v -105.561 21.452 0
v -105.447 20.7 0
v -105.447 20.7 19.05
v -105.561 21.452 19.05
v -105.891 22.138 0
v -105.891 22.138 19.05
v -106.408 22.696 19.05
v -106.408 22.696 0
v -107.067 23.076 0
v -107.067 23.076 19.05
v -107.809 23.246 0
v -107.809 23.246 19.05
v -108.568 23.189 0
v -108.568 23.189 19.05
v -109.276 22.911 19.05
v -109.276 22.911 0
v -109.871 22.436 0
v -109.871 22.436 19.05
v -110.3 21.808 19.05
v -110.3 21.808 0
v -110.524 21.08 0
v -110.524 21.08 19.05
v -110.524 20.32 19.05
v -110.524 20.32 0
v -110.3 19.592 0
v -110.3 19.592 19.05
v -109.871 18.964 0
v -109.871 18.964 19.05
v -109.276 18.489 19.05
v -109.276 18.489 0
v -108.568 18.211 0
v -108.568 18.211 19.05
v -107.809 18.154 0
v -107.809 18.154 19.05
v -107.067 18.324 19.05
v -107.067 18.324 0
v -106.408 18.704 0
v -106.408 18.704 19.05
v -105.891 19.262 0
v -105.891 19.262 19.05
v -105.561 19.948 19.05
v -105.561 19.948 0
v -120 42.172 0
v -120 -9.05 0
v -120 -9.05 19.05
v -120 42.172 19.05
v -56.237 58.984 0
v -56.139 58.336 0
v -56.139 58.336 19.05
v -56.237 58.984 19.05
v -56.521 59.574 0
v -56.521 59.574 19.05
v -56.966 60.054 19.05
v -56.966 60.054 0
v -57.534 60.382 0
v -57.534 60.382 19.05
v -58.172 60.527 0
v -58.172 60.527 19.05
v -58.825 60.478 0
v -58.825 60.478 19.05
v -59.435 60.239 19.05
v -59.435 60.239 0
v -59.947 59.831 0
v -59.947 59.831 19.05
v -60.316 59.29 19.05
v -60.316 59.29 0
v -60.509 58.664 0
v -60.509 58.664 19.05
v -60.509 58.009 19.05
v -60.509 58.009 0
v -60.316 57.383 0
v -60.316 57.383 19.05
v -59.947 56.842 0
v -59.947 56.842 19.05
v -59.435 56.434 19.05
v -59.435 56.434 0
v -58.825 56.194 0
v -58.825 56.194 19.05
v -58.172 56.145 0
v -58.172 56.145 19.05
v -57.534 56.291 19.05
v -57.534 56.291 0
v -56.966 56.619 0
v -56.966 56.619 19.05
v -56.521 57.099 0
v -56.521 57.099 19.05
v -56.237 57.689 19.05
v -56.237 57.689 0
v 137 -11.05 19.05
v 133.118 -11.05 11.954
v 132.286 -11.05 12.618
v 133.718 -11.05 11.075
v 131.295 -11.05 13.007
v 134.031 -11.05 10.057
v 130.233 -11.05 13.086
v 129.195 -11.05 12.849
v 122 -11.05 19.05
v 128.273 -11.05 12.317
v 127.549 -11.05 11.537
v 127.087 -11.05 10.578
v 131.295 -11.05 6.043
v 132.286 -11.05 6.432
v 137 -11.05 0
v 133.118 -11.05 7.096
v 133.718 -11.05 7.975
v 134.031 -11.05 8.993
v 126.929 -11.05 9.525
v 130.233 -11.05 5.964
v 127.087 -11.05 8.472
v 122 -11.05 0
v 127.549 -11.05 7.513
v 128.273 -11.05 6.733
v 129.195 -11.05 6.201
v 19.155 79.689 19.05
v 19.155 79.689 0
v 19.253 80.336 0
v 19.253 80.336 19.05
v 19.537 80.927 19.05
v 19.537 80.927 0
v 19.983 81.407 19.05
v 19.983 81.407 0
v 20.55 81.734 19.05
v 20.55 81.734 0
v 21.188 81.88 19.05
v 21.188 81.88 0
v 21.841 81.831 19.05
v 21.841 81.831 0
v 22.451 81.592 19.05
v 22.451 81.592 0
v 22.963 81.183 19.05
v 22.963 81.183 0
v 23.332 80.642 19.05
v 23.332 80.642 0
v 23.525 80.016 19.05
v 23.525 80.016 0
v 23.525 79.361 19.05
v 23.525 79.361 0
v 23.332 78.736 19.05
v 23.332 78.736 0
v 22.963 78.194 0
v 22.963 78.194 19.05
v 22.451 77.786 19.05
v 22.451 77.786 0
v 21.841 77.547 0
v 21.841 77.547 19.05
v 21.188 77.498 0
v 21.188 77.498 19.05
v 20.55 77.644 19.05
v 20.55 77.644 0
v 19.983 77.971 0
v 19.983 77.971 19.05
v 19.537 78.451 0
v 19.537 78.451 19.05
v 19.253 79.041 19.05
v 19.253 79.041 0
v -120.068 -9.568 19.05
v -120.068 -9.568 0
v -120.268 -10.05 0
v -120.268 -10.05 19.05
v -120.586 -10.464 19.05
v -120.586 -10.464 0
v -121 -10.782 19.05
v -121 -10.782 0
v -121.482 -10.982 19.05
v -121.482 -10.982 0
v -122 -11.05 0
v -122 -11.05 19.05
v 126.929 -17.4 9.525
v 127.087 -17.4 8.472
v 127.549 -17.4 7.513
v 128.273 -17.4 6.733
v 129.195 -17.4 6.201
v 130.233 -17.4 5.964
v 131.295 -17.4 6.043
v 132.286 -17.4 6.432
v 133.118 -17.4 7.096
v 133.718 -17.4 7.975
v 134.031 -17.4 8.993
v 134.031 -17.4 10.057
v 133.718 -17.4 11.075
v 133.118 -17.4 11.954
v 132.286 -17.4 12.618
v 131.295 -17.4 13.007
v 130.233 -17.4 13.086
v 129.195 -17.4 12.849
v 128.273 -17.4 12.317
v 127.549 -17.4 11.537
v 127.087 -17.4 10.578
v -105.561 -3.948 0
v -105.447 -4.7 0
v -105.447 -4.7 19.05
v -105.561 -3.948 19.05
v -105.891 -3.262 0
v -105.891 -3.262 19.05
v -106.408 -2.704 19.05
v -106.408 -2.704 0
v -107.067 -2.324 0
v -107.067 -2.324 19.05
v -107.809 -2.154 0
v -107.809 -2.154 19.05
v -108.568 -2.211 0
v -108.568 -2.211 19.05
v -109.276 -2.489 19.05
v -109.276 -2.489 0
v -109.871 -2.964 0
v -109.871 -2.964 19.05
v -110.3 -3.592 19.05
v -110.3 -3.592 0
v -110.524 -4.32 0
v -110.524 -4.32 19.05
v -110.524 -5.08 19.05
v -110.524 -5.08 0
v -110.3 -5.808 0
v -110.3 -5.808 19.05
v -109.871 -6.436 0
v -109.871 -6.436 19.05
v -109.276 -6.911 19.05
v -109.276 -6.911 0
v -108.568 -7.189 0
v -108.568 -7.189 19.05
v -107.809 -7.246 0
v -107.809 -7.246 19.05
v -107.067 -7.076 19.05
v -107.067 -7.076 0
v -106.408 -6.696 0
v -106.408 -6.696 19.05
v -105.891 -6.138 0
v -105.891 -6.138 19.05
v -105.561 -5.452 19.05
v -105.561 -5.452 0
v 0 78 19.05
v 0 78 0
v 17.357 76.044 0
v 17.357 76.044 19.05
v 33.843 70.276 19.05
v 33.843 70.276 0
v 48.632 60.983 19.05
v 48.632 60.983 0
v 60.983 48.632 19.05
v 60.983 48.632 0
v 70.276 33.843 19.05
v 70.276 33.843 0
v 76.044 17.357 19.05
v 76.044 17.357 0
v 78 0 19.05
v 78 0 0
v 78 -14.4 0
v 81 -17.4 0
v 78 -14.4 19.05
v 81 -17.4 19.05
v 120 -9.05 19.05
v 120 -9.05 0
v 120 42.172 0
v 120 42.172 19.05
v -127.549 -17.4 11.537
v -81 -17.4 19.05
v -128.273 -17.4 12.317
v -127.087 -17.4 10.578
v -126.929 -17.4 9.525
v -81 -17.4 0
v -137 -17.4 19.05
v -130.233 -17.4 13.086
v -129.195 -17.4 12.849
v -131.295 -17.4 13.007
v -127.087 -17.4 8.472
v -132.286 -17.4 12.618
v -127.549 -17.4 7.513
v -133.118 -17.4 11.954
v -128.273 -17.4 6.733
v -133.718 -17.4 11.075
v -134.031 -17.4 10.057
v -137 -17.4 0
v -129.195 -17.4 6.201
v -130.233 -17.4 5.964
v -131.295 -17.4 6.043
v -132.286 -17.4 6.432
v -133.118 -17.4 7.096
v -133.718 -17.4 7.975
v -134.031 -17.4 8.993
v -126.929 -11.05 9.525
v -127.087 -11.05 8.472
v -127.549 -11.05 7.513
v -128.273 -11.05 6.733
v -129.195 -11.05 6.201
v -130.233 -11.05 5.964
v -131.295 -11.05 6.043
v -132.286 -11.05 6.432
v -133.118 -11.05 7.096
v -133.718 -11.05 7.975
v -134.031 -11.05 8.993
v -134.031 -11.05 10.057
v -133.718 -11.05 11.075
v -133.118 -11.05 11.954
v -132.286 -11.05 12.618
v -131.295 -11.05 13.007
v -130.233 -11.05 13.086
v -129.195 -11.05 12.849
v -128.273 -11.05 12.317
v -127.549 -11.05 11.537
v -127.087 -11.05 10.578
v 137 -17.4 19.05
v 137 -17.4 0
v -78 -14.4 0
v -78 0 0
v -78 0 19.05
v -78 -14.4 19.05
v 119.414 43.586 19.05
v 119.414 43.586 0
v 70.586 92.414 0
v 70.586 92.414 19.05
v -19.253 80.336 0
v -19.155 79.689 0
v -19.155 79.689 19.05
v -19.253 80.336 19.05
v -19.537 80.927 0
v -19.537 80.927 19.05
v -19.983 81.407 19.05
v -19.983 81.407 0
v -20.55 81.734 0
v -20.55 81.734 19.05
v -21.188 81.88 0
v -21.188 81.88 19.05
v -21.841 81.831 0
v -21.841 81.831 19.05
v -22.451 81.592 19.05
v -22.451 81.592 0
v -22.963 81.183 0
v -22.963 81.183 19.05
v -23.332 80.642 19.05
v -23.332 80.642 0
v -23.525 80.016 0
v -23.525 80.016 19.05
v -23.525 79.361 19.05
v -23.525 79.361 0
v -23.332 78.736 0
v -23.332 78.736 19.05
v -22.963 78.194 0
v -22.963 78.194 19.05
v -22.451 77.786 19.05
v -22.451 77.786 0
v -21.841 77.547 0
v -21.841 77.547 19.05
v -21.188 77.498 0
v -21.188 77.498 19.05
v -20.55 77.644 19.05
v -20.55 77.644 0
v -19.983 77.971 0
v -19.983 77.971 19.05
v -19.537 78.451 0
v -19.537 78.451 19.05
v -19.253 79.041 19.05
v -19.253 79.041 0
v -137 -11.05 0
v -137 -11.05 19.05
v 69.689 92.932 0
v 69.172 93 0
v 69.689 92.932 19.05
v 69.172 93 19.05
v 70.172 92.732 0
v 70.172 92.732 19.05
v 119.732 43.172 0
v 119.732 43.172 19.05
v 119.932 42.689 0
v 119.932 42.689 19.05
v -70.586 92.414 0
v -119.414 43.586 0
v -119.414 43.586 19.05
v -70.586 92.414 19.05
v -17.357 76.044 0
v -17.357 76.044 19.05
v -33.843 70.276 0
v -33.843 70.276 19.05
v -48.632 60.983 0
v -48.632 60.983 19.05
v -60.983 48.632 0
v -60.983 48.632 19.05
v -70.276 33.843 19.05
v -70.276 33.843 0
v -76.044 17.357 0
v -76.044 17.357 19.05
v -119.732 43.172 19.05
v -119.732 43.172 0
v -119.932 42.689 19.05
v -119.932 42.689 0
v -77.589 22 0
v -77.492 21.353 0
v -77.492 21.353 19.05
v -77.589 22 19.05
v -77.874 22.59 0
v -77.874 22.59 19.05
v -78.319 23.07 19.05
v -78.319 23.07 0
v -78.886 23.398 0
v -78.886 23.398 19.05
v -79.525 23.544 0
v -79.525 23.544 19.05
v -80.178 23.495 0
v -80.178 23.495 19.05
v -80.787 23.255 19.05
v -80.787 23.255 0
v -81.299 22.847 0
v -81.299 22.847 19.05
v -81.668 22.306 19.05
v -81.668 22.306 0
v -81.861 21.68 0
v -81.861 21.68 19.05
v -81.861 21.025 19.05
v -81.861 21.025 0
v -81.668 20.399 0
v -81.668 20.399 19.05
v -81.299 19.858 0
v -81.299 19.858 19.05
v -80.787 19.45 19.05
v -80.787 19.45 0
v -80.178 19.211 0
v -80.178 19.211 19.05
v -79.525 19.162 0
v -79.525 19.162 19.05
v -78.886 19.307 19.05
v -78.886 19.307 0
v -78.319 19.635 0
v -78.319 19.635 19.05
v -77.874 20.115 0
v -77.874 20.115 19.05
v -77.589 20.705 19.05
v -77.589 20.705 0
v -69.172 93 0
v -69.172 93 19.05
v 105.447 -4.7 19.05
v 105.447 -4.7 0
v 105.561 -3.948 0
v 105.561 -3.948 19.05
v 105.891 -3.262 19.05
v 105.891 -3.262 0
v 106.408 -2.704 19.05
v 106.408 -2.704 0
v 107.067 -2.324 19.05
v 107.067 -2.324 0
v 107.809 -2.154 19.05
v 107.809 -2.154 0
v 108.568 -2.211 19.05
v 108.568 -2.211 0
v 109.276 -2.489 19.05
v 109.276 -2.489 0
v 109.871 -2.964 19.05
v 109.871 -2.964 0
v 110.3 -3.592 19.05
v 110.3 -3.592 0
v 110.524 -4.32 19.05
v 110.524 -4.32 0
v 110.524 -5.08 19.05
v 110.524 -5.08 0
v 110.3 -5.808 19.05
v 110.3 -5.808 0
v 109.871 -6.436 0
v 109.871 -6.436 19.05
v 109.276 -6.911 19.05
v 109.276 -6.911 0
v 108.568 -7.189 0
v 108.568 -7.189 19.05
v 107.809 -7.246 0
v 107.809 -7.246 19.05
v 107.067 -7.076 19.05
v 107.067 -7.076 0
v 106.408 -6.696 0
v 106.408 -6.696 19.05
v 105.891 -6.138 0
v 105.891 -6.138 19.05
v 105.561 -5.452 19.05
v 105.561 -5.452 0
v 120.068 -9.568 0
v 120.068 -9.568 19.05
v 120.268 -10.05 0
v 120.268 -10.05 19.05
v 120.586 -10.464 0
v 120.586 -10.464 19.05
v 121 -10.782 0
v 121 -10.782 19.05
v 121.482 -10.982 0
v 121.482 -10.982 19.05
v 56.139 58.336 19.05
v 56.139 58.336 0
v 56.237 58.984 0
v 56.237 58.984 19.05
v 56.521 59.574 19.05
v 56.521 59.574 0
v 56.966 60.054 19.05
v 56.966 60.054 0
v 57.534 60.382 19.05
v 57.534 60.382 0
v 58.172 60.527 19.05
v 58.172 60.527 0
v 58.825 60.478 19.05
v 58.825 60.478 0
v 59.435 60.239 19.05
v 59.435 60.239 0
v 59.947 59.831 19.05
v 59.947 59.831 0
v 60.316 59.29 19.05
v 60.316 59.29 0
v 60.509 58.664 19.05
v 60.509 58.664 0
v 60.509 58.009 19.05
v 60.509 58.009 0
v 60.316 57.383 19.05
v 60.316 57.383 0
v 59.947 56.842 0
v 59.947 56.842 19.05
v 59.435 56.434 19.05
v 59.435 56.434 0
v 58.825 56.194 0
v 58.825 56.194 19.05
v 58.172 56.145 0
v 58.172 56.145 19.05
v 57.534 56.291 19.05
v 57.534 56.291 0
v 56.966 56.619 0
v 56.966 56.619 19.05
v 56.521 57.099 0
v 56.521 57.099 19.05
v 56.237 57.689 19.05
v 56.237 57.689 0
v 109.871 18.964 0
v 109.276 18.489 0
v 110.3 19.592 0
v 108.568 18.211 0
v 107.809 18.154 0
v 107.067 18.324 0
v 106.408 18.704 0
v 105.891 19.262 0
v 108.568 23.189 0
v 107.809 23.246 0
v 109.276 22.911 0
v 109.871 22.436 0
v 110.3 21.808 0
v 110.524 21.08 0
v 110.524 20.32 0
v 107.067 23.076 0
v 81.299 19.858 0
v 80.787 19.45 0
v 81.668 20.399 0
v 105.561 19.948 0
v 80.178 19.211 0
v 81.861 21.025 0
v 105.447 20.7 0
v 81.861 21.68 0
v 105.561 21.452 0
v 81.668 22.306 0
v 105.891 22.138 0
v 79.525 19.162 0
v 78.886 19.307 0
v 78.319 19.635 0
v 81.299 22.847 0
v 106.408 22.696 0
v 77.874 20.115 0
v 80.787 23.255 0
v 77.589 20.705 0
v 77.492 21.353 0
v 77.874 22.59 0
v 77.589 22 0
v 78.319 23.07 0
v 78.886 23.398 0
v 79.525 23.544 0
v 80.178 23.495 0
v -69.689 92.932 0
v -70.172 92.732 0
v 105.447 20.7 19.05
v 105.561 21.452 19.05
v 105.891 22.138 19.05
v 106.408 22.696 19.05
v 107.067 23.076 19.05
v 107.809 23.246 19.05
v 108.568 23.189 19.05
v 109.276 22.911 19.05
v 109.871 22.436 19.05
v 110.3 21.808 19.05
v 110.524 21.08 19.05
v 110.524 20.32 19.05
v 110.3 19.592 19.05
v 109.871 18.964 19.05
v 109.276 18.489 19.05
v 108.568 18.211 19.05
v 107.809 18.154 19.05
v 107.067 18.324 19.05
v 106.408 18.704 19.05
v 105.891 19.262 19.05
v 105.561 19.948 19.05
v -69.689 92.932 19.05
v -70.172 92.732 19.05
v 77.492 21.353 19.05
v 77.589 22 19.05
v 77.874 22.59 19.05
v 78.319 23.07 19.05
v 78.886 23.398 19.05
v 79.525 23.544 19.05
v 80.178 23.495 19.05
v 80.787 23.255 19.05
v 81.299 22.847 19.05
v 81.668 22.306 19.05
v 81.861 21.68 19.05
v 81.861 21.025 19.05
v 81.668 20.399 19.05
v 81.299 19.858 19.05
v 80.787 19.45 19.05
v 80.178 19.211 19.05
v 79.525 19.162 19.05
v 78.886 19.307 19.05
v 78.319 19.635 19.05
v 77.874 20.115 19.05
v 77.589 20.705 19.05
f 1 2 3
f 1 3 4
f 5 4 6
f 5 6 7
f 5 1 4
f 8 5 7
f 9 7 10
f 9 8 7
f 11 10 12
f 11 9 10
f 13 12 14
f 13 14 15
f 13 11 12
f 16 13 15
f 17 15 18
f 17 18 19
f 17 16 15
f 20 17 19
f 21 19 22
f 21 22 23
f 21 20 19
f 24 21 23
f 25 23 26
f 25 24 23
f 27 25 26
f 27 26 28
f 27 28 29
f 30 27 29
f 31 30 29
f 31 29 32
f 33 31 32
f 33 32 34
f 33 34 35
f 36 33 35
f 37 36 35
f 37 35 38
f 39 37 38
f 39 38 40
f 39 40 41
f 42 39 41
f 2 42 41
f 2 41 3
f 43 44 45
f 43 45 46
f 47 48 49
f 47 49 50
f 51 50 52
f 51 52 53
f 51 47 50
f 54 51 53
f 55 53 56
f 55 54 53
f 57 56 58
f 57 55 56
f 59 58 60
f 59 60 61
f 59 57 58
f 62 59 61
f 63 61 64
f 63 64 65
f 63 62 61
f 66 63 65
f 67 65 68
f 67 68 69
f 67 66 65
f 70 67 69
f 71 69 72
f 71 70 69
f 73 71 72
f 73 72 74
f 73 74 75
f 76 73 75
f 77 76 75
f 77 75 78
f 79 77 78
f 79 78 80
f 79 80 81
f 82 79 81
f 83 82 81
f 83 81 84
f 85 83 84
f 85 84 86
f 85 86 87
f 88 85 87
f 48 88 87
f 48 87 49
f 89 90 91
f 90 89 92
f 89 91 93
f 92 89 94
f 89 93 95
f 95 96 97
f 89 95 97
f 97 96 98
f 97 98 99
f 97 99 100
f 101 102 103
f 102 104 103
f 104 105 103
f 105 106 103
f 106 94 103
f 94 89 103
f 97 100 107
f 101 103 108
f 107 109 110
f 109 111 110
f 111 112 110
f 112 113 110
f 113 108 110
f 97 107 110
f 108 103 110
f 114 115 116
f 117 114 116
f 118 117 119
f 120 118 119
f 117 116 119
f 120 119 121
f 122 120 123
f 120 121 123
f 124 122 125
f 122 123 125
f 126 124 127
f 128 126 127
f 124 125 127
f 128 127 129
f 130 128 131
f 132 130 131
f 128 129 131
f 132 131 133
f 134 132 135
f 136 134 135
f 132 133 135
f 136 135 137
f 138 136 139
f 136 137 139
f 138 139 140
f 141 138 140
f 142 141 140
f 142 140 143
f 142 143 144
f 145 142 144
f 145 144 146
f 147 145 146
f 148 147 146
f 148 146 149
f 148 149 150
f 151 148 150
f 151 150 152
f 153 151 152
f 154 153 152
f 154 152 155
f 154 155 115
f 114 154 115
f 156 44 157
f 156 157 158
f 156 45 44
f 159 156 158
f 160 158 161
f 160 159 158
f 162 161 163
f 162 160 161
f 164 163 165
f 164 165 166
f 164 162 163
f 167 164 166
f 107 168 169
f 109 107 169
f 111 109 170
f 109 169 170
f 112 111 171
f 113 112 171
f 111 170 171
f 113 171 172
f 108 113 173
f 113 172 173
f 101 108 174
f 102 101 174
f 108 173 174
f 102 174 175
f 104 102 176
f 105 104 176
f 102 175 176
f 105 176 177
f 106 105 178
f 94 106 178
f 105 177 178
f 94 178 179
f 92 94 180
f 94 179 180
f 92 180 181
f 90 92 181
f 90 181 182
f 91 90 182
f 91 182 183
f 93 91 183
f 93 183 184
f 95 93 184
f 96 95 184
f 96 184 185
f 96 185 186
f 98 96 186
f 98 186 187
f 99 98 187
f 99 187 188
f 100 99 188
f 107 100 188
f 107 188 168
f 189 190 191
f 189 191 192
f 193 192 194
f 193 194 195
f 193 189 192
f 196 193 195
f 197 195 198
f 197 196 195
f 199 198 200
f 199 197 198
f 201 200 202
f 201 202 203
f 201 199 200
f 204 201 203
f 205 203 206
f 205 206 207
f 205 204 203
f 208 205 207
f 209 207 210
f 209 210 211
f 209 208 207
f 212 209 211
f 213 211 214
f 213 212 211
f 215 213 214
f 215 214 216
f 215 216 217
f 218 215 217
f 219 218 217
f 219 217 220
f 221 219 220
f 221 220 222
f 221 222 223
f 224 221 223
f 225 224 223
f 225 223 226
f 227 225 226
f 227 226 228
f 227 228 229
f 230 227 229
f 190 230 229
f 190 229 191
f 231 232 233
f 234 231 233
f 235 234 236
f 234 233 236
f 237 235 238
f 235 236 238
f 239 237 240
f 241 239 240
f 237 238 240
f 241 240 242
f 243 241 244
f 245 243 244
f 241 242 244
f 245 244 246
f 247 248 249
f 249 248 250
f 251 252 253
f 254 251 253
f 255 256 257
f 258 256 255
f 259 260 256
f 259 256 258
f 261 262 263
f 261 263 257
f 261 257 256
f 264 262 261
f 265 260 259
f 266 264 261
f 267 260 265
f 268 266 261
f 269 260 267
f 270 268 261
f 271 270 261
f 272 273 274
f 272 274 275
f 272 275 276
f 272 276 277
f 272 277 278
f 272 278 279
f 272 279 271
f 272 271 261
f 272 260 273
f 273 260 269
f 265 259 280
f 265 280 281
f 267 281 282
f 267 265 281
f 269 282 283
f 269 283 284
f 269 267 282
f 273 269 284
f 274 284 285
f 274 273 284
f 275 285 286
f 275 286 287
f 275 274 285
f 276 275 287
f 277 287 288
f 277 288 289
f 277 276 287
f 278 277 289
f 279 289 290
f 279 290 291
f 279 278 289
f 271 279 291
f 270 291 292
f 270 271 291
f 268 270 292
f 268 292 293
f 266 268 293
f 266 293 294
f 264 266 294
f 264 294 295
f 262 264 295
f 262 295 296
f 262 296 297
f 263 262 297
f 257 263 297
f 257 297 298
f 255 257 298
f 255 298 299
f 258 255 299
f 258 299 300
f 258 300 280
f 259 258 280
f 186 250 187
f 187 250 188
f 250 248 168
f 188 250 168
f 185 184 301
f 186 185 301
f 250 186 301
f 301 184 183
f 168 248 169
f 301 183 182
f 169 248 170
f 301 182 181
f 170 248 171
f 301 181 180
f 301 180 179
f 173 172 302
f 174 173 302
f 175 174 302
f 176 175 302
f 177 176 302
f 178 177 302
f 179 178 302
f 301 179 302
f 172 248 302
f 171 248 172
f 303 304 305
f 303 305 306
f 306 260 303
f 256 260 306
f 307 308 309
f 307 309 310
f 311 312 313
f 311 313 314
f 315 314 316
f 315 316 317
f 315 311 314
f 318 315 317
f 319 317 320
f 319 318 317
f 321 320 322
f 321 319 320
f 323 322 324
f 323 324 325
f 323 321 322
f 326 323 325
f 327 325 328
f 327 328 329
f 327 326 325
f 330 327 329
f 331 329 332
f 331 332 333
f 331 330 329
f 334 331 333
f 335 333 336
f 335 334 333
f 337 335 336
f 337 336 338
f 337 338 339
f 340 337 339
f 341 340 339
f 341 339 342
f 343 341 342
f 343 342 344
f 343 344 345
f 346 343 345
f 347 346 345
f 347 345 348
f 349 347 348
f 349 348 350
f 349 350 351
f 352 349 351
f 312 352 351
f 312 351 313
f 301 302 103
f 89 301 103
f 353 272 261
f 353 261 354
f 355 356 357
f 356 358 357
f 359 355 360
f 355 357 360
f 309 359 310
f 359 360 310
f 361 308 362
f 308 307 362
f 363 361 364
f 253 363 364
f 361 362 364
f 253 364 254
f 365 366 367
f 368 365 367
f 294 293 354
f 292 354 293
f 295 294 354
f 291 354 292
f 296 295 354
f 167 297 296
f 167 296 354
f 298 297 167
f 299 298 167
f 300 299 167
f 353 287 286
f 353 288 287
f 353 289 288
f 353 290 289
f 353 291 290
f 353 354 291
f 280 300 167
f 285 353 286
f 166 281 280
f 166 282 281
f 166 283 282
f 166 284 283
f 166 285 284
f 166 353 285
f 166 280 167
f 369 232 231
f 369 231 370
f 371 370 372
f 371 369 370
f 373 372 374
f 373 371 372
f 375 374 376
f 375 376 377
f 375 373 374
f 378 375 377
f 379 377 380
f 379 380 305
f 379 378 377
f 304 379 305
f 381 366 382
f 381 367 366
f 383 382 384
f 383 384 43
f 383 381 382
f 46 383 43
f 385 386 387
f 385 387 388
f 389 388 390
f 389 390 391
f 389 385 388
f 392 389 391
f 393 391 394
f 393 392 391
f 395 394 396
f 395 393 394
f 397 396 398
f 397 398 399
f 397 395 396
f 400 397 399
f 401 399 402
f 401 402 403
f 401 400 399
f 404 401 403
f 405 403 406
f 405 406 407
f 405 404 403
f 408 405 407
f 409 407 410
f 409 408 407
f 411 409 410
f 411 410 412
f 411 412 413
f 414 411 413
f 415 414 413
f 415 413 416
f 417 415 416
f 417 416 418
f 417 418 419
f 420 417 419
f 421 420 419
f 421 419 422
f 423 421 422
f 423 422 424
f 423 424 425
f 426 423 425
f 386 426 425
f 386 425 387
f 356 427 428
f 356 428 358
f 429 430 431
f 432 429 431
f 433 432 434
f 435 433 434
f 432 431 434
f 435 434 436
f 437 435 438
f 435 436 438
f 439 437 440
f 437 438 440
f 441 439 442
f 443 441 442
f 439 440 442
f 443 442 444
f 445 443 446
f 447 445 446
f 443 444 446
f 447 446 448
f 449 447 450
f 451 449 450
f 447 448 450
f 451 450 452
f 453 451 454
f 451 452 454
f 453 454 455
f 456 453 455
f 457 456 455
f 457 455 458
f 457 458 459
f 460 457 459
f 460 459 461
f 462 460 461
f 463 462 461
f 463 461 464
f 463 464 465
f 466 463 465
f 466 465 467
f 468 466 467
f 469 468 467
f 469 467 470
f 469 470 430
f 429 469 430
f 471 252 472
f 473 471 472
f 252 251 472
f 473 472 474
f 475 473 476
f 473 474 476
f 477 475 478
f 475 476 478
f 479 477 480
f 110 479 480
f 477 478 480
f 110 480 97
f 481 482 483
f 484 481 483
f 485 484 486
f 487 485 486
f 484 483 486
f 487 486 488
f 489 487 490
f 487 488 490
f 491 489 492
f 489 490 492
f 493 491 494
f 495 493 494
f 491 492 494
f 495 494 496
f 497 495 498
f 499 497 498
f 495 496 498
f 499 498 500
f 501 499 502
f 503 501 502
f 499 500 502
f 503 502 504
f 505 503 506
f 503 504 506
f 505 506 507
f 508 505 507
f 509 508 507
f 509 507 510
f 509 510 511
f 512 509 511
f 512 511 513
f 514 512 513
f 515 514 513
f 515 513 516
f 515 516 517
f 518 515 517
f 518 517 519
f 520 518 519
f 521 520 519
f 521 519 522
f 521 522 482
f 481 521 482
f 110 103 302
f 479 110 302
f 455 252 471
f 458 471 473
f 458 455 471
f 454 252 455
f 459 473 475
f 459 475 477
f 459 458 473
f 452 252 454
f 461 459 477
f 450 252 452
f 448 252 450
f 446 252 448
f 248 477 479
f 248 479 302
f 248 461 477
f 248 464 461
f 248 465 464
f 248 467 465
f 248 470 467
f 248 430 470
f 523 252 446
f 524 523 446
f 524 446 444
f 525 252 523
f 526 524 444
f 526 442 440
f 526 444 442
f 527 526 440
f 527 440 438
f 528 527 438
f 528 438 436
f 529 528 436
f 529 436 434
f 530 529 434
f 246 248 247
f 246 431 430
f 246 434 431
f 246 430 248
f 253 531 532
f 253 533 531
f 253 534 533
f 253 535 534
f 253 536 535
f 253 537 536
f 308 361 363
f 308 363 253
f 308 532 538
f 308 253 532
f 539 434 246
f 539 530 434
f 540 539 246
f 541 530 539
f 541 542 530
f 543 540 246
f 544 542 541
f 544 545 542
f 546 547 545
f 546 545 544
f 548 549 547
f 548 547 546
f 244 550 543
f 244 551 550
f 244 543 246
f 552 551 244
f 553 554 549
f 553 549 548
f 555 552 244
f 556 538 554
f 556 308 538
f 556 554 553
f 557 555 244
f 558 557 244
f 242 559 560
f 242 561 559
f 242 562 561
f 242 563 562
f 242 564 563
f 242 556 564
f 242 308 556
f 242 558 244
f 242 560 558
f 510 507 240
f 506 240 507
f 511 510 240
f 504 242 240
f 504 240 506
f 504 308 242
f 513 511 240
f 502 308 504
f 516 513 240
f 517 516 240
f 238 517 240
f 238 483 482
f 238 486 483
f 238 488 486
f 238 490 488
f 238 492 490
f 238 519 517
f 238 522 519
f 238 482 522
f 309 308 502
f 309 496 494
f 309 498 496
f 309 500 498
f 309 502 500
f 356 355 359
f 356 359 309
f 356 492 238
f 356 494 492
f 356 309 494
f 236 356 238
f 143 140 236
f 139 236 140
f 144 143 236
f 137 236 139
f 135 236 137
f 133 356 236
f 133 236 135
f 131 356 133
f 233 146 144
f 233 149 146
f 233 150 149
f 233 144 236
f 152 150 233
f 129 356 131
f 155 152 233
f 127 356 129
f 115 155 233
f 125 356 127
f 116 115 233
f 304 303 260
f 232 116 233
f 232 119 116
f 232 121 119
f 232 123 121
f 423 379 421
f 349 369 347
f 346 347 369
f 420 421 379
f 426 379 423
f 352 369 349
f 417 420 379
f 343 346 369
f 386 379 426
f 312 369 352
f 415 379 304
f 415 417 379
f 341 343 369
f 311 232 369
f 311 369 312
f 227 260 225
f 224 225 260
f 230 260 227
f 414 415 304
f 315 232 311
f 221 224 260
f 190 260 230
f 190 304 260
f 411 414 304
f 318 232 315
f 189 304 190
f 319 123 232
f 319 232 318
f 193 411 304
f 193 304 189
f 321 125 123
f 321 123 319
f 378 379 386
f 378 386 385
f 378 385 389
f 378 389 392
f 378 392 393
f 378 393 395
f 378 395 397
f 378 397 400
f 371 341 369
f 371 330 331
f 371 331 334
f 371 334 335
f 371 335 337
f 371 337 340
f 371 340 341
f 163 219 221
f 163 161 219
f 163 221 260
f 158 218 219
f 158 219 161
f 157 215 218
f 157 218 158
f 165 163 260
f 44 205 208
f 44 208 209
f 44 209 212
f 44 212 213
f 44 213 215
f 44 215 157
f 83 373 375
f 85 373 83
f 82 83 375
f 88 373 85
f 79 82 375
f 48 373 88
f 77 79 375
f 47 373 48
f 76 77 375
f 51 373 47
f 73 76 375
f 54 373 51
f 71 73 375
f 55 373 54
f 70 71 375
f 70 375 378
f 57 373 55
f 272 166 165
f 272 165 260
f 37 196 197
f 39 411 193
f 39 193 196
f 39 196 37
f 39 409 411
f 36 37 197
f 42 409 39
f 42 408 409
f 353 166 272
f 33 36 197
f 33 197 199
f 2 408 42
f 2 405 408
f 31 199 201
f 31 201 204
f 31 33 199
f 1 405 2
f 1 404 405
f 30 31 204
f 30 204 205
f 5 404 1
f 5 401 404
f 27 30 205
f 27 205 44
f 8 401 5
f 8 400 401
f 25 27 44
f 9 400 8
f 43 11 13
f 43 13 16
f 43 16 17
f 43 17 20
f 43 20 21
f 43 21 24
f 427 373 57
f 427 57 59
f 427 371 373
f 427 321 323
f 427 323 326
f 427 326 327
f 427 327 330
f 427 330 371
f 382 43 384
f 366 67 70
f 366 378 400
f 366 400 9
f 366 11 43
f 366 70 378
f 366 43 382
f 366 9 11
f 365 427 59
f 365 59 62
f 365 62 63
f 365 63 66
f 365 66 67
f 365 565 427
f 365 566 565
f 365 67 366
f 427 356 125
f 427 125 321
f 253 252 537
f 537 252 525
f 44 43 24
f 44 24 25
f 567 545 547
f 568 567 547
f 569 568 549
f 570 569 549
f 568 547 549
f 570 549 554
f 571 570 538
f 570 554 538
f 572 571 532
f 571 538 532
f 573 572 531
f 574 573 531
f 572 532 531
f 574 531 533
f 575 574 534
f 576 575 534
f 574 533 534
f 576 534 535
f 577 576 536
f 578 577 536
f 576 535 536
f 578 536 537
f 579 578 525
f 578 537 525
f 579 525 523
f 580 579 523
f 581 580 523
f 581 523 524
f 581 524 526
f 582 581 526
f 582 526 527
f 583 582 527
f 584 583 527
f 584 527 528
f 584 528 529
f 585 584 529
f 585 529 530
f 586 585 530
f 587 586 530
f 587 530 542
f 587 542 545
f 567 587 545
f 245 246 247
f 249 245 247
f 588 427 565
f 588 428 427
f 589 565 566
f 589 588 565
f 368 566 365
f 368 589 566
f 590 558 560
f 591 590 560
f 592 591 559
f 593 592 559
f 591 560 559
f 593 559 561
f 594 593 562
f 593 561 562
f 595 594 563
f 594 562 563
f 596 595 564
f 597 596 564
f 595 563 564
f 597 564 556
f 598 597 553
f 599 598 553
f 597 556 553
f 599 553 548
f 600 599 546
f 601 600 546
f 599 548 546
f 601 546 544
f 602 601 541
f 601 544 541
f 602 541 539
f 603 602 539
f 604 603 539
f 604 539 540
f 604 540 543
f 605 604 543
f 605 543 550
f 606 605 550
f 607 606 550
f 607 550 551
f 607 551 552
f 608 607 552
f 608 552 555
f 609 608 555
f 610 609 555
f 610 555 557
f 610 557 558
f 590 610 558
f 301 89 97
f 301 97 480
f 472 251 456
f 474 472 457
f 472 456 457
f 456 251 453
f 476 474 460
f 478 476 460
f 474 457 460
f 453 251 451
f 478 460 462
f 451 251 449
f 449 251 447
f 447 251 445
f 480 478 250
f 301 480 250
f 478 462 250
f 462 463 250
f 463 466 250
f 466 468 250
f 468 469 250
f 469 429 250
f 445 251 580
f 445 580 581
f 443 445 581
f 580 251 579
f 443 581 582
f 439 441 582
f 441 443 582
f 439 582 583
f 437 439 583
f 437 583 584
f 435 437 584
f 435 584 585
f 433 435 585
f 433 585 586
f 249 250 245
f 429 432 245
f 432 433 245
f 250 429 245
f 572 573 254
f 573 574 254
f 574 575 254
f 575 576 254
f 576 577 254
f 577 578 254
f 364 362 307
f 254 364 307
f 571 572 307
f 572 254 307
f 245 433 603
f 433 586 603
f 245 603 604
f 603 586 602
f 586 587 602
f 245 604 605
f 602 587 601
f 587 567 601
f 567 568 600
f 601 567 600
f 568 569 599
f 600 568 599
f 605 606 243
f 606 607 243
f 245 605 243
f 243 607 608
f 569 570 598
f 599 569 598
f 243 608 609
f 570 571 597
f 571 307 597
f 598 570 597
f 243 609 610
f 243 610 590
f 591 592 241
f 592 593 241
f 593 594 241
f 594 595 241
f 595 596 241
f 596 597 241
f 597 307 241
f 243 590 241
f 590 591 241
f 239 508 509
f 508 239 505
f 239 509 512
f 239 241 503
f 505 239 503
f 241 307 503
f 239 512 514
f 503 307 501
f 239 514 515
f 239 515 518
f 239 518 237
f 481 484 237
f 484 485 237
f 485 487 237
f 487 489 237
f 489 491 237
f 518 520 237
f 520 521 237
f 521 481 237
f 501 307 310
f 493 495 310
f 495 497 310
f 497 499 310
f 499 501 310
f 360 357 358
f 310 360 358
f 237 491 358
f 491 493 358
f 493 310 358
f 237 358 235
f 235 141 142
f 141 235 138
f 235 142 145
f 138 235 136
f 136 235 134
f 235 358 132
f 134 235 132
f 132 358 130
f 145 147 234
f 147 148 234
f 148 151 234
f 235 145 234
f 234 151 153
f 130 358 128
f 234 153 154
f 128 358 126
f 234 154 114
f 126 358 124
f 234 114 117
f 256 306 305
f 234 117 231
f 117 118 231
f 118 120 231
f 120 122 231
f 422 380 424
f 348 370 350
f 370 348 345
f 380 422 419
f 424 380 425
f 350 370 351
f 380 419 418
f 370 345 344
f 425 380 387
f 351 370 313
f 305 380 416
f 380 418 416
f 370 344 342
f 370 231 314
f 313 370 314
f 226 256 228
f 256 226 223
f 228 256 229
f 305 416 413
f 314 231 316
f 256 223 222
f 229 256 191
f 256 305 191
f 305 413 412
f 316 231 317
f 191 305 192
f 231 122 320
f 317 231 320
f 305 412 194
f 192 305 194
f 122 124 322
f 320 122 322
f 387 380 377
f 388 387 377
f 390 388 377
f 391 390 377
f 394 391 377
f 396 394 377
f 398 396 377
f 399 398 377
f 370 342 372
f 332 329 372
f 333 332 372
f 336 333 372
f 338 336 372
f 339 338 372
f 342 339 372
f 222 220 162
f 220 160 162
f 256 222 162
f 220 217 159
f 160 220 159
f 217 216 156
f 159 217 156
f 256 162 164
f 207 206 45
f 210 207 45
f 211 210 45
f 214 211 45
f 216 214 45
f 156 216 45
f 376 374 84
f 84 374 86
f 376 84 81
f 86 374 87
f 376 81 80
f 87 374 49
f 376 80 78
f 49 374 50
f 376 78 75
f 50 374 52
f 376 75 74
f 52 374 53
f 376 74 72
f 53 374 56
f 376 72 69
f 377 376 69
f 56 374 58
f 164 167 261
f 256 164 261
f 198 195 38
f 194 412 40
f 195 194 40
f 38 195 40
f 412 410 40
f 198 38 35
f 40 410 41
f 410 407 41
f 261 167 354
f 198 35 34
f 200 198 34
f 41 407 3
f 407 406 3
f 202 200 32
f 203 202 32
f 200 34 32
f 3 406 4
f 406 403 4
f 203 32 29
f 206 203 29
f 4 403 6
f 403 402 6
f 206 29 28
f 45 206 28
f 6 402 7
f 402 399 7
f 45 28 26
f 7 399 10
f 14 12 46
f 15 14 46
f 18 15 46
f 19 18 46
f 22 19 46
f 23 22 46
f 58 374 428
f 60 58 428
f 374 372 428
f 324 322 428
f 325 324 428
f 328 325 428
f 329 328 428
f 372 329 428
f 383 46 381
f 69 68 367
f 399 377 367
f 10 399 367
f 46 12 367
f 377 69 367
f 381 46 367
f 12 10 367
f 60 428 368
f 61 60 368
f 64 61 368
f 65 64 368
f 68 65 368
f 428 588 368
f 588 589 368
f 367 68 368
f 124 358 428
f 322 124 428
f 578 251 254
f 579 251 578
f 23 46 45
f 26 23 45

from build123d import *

# Parameters (mm, degrees)
BOSS_EXTRUDE1_DEPTH              = 19.05
TAPPED_HOLE_FOR_8_32_HELICOIL1_D = 4.3942
F_1_4_20_TAPPED_HOLE1_D          = 5.1054
F_1_4_CLEARANCE_HOLE1_D          = 7.14248
F_1_4_CLEARANCE_HOLE1_DEPTH      = 12.7
F_1_4_CLEARANCE_HOLE1_TIP        = 2.145817477
CHAMFER2_SIZE                    = 3
CHAMFER3_SIZE                    = 50
FILLET2_R                        = 2


with BuildPart() as part:
    # Sketch1 → Boss-Extrude1 (new body)
    with BuildSketch(Plane.XY):
        with BuildLine():
            Line((78, 0), (78, -17.4))
            Line((78, -17.4), (137, -17.4))
            Line((137, -17.4), (137, -11.05))
            Line((137, -11.05), (120, -11.05))
            Line((120, -11.05), (120, 93))
            Line((120, 93), (0, 93))
            Line((0, 93), (0, 78))
            ThreePointArc((0, 78), (55.154328933, 55.154328933), (78, 0))
        make_face()
    extrude(amount=BOSS_EXTRUDE1_DEPTH)

    # Tapped Hole for #8-32 Helicoil1 (through all)
    with Locations(Plane.XY.offset(19.05)):
        with Locations((21.352571221, 79.688880669), (58.336309448, 58.336309448), (79.688880669, 21.352571221)):
            Hole(TAPPED_HOLE_FOR_8_32_HELICOIL1_D / 2)

    # 1/4-20 Tapped Hole1 (through all)
    with Locations(Plane.XY.offset(19.05)):
        with Locations((108, 20.7), (108, -4.7)):
            Hole(F_1_4_20_TAPPED_HOLE1_D / 2)

    # 1/4 Clearance Hole1
    with Locations(Plane(origin=(0, -11.05, 0), x_dir=(1, 0, 0), z_dir=(0, 1, 0))):
        with Locations((130.5, -9.525)):
            Hole(F_1_4_CLEARANCE_HOLE1_D / 2, depth=F_1_4_CLEARANCE_HOLE1_DEPTH)
            with Locations((0, 0, -(F_1_4_CLEARANCE_HOLE1_DEPTH + F_1_4_CLEARANCE_HOLE1_TIP / 2))):  # 118° drill point
                Cone(0, F_1_4_CLEARANCE_HOLE1_D / 2, F_1_4_CLEARANCE_HOLE1_TIP, mode=Mode.SUBTRACT)

    # Chamfer2
    chamfer2_edges = [part.edges().sort_by_distance(p)[0] for p in [
        (78, -17.4, 9.525),
    ]]
    chamfer(chamfer2_edges, length=CHAMFER2_SIZE)

    # Chamfer3
    chamfer3_edges = [part.edges().sort_by_distance(p)[0] for p in [
        (120, 93, 9.525),
    ]]
    chamfer(chamfer3_edges, length=CHAMFER3_SIZE)

    # Fillet2
    fillet2_edges = [part.edges().sort_by_distance(p)[0] for p in [
        (120, -11.05, 9.525),
        (70, 93, 9.525),
        (120, 43, 9.525),
    ]]
    fillet(fillet2_edges, radius=FILLET2_R)

    # Mirror2: part across plane


with BuildPart() as part_1:
    add(part.part)
    add(part.part.mirror(Plane(origin=(0, 0, 0), x_dir=(0, 0, 1), z_dir=(1, 0, 0))))


solid = part_1.part
